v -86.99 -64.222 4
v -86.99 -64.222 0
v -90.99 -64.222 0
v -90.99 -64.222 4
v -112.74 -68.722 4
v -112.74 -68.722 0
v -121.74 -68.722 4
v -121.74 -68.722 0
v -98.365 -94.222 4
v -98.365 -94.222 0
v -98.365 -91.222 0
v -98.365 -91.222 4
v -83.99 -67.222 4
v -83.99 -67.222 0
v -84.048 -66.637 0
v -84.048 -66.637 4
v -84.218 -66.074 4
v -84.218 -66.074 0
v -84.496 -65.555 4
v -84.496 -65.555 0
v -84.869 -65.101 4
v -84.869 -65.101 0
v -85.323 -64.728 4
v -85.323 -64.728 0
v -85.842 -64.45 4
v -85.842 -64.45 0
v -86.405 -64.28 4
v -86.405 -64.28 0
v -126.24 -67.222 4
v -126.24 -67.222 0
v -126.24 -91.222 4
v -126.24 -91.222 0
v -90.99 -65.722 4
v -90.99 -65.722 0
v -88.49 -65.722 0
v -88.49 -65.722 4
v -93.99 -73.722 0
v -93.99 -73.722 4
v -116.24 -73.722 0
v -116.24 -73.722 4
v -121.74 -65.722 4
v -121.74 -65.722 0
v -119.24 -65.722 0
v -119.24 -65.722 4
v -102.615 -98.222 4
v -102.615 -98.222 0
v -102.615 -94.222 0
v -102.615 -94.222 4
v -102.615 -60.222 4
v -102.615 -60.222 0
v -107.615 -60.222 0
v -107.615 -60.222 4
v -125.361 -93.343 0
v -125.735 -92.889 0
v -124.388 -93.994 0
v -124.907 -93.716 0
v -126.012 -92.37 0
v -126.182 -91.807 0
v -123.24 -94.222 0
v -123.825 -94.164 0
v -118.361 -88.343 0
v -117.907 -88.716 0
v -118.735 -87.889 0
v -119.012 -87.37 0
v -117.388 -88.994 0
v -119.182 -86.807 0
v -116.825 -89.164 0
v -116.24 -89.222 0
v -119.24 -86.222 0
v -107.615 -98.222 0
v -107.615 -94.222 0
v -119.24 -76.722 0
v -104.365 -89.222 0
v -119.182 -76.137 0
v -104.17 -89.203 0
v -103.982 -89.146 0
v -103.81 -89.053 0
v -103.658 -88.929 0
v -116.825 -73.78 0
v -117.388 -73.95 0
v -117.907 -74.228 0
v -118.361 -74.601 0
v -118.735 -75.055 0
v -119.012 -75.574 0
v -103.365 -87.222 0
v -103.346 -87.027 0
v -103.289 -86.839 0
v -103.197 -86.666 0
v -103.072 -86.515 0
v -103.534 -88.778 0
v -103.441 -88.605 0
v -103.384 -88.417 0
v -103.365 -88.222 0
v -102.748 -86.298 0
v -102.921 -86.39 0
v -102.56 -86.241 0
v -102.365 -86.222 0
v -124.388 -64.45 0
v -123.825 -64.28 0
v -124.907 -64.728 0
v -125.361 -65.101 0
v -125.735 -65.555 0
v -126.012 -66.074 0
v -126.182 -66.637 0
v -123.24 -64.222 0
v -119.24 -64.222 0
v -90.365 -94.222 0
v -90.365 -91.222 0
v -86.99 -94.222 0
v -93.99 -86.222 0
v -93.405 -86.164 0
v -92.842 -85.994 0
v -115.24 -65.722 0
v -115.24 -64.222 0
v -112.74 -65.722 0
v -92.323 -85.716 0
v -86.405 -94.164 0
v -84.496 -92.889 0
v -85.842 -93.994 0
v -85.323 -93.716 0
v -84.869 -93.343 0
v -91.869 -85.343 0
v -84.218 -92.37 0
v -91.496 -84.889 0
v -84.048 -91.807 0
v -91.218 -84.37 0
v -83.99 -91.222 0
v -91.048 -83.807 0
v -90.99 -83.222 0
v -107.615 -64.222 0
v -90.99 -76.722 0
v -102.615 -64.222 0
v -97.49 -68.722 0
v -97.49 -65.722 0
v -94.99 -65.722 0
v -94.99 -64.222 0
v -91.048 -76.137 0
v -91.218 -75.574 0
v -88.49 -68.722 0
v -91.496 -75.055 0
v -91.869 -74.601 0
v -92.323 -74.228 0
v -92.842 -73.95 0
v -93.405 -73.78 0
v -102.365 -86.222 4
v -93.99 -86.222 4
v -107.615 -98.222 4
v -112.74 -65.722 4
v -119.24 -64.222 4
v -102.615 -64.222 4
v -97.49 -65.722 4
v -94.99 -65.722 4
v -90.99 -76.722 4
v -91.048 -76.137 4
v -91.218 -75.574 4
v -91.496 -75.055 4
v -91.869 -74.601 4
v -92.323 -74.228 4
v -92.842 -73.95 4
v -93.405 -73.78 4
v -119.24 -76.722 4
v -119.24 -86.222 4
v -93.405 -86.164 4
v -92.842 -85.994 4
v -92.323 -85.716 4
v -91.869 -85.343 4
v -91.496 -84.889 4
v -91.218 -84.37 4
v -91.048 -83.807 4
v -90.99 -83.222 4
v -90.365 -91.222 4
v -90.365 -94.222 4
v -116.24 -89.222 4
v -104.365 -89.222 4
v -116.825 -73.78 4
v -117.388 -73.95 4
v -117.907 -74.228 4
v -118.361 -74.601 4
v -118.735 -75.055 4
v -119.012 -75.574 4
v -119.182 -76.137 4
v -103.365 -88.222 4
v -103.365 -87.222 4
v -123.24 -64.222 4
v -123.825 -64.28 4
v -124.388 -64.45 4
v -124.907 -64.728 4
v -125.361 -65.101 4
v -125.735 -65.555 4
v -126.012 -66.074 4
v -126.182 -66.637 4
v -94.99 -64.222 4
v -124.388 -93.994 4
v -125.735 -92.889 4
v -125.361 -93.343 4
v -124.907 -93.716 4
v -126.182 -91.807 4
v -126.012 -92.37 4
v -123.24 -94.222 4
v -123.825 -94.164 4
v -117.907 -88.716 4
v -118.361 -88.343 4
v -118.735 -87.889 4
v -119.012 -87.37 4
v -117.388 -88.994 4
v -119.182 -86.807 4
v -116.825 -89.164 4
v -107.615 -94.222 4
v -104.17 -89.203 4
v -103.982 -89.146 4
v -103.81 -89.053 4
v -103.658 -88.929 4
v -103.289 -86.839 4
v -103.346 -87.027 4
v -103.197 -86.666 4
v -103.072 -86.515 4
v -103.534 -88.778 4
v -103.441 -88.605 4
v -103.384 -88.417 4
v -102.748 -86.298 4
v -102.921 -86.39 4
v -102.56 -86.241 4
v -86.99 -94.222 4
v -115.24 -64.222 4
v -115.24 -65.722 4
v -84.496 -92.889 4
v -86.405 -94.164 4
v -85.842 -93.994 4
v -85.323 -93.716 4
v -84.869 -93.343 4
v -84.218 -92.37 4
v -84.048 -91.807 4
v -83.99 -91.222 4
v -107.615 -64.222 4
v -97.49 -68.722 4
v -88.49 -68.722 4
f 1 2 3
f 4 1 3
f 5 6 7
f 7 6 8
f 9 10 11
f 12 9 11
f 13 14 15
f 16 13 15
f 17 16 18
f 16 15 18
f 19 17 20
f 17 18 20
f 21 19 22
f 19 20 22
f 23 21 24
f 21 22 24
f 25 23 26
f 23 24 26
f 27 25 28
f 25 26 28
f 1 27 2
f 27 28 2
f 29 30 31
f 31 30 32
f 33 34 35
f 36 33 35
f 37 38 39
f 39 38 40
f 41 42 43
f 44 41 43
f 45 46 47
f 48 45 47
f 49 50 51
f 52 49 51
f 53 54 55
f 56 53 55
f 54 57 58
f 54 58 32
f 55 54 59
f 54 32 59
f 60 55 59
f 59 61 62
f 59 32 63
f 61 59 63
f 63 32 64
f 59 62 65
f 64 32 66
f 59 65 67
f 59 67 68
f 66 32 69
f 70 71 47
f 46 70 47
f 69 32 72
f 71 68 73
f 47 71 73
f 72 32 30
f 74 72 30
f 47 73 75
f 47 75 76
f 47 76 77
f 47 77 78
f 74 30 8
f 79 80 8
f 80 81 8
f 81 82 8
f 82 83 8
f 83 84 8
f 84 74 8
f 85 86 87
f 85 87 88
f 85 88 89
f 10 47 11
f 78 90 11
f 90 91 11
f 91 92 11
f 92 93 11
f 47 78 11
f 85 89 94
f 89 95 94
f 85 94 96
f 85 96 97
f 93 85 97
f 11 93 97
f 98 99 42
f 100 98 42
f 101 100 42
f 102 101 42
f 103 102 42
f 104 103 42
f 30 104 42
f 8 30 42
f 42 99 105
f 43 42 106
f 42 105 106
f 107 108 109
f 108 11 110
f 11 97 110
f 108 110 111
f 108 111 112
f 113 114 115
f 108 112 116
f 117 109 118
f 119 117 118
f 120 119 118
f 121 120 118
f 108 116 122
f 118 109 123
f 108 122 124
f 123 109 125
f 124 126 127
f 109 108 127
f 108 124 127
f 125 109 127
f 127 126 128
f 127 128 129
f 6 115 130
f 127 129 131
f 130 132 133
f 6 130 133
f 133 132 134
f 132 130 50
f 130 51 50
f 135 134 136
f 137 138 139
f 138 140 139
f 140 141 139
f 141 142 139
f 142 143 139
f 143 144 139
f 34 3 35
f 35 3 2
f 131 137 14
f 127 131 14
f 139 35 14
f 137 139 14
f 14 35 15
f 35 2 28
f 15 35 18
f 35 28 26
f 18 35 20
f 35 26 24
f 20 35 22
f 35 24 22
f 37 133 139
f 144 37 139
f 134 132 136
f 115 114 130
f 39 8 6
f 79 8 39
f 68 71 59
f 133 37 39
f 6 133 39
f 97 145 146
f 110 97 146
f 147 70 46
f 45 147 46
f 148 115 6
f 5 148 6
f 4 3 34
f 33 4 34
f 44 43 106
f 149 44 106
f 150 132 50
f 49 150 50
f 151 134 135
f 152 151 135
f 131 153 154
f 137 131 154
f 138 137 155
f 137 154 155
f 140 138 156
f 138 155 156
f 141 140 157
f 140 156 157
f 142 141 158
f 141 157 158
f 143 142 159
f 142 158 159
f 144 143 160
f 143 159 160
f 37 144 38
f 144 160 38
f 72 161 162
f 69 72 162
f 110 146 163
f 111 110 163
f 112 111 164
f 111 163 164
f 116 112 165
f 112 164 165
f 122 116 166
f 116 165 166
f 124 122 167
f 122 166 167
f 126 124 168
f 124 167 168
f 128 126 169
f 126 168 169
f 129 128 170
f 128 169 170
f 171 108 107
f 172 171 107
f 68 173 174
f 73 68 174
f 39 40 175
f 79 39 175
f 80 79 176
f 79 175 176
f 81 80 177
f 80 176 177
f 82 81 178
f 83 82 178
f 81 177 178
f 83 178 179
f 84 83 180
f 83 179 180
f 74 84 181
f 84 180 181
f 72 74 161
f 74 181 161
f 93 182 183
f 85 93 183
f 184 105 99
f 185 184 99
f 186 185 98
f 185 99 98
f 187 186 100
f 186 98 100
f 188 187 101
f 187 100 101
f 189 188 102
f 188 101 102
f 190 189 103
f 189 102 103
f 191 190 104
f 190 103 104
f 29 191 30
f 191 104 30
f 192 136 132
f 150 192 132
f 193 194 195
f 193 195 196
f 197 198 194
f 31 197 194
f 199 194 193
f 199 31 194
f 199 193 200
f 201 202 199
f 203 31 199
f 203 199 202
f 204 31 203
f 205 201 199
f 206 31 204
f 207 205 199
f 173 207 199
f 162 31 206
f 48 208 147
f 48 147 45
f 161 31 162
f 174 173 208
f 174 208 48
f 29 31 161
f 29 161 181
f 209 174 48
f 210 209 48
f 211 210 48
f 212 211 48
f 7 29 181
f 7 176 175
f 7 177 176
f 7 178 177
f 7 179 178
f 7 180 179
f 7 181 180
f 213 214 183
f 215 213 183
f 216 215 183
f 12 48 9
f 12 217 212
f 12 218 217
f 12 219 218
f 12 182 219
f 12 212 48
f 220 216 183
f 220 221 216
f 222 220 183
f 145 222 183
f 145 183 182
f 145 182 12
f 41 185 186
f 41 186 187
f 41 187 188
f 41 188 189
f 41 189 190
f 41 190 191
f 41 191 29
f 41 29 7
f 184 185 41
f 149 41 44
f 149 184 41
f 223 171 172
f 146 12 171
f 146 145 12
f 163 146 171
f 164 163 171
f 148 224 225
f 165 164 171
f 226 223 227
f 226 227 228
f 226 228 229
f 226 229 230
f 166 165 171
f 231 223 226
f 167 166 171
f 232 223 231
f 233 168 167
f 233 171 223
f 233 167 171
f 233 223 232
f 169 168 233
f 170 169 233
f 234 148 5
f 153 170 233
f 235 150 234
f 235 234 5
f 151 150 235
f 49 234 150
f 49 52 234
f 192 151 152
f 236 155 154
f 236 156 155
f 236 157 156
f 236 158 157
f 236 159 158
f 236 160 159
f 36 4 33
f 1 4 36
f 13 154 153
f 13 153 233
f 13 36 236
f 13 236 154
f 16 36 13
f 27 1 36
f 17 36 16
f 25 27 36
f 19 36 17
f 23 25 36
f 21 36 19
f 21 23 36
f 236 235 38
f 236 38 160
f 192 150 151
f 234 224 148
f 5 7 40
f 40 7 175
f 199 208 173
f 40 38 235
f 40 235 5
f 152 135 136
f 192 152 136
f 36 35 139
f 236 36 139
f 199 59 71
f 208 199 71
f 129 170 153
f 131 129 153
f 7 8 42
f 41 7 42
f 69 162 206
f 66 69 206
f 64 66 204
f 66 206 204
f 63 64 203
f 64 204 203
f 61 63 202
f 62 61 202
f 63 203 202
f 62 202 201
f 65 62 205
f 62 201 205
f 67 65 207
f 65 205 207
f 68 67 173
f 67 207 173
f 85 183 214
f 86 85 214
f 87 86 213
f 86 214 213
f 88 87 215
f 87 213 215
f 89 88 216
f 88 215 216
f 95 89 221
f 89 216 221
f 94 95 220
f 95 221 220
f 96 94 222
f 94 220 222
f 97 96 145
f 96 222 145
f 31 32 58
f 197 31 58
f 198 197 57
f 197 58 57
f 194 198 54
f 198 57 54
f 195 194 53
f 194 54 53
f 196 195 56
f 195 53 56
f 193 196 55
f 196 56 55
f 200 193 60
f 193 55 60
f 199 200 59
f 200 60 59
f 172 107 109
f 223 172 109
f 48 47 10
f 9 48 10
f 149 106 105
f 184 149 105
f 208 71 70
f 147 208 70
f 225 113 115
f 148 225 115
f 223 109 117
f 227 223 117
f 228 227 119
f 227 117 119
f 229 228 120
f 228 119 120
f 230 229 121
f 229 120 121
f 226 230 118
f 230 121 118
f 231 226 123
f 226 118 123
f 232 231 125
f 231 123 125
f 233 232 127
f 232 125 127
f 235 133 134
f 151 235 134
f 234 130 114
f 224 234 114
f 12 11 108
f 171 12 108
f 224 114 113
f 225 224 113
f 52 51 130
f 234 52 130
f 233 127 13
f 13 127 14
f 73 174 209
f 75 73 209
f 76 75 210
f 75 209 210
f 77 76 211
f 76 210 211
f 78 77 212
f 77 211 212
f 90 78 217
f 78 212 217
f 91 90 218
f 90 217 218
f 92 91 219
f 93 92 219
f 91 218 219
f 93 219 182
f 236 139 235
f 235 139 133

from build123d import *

# Parameters (mm, degrees)
SALIENTE_EXTRUIR1_DEPTH = 4
CORTAR_EXTRUIR1_DEPTH   = 4


with BuildPart() as part:
    # Croquis1 → Saliente-Extruir1 (new body)
    with BuildSketch(Plane.XY):
        with BuildLine():
            Line((-102.615102368, -94.221952824), (-98.365102368, -94.221952824))
            Line((-98.365102368, -94.221952824), (-98.365102368, -91.221952824))
            Line((-98.365102368, -91.221952824), (-90.365102368, -91.221952824))
            Line((-90.365102368, -91.221952824), (-90.365102368, -94.221952824))
            Line((-90.365102368, -94.221952824), (-86.990102368, -94.221952824))
            ThreePointArc((-86.990102368, -94.221952824), (-84.868782024, -93.343273168), (-83.990102368, -91.221952824))
            Line((-83.990102368, -91.221952824), (-83.990102368, -67.221952824))
            ThreePointArc((-83.990102368, -67.221952824), (-84.868782024, -65.10063248), (-86.990102368, -64.221952824))
            Line((-86.990102368, -64.221952824), (-90.990102368, -64.221952824))
            Line((-90.990102368, -64.221952824), (-90.990102368, -65.721952824))
            Line((-90.990102368, -65.721952824), (-88.490102368, -65.721952824))
            Line((-88.490102368, -65.721952824), (-88.490102368, -68.721952824))
            Line((-88.490102368, -68.721952824), (-97.490102368, -68.721952824))
            Line((-97.490102368, -68.721952824), (-97.490102368, -65.721952824))
            Line((-97.490102368, -65.721952824), (-94.990102368, -65.721952824))
            Line((-94.990102368, -65.721952824), (-94.990102368, -64.221952824))
            Line((-94.990102368, -64.221952824), (-102.615102368, -64.221952824))
            Line((-102.615102368, -64.221952824), (-102.615102368, -60.221952824))
            Line((-102.615102368, -60.221952824), (-105.115102368, -60.221952824))
            Line((-105.115102368, -60.221952824), (-107.615102368, -60.221952824))
            Line((-107.615102368, -60.221952824), (-107.615102368, -64.221952824))
            Line((-107.615102368, -64.221952824), (-115.240102368, -64.221952824))
            Line((-115.240102368, -64.221952824), (-115.240102368, -65.721952824))
            Line((-115.240102368, -65.721952824), (-112.740102368, -65.721952824))
            Line((-112.740102368, -65.721952824), (-112.740102368, -68.721952824))
            Line((-112.740102368, -68.721952824), (-121.740102368, -68.721952824))
            Line((-121.740102368, -68.721952824), (-121.740102368, -65.721952824))
            Line((-121.740102368, -65.721952824), (-119.240102368, -65.721952824))
            Line((-119.240102368, -65.721952824), (-119.240102368, -64.221952824))
            Line((-119.240102368, -64.221952824), (-123.240102368, -64.221952824))
            ThreePointArc((-123.240102368, -64.221952824), (-125.361422711, -65.10063248), (-126.240102368, -67.221952824))
            Line((-126.240102368, -67.221952824), (-126.240102368, -91.221952824))
            ThreePointArc((-126.240102368, -91.221952824), (-125.361422711, -93.343273168), (-123.240102368, -94.221952824))
            Line((-123.240102368, -94.221952824), (-107.615102368, -94.221952824))
            Line((-107.615102368, -94.221952824), (-107.615102368, -98.221952824))
            Line((-107.615102368, -98.221952824), (-105.115102368, -98.221952824))
            Line((-105.115102368, -98.221952824), (-102.615102368, -98.221952824))
            Line((-102.615102368, -98.221952824), (-102.615102368, -94.221952824))
        make_face()
    extrude(amount=SALIENTE_EXTRUIR1_DEPTH)

    # Croquis2 → Cortar-Extruir1 (cut)
    with BuildSketch(Plane.XY.offset(4)):
        with BuildLine():
            Line((-102.365102368, -86.221952824), (-93.990102368, -86.221952824))
            ThreePointArc((-93.990102368, -86.221952824), (-91.868782024, -85.343273168), (-90.990102368, -83.221952824))
            Line((-90.990102368, -83.221952824), (-90.990102368, -76.721952824))
            ThreePointArc((-90.990102368, -76.721952824), (-91.868782024, -74.60063248), (-93.990102368, -73.721952824))
            Line((-93.990102368, -73.721952824), (-116.240102368, -73.721952824))
            ThreePointArc((-116.240102368, -73.721952824), (-118.361422711, -74.60063248), (-119.240102368, -76.721952824))
            Line((-119.240102368, -76.721952824), (-119.240102368, -86.221952824))
            ThreePointArc((-119.240102368, -86.221952824), (-118.361422711, -88.343273168), (-116.240102368, -89.221952824))
            Line((-116.240102368, -89.221952824), (-104.365102368, -89.221952824))
            ThreePointArc((-104.365102368, -89.221952824), (-103.657995587, -88.929059605), (-103.365102368, -88.221952824))
            Line((-103.365102368, -88.221952824), (-103.365102368, -87.221952824))
            ThreePointArc((-103.365102368, -87.221952824), (-103.072209149, -86.514846043), (-102.365102368, -86.221952824))
        make_face()
    extrude(amount=-CORTAR_EXTRUIR1_DEPTH, mode=Mode.SUBTRACT)


solid = part.part
